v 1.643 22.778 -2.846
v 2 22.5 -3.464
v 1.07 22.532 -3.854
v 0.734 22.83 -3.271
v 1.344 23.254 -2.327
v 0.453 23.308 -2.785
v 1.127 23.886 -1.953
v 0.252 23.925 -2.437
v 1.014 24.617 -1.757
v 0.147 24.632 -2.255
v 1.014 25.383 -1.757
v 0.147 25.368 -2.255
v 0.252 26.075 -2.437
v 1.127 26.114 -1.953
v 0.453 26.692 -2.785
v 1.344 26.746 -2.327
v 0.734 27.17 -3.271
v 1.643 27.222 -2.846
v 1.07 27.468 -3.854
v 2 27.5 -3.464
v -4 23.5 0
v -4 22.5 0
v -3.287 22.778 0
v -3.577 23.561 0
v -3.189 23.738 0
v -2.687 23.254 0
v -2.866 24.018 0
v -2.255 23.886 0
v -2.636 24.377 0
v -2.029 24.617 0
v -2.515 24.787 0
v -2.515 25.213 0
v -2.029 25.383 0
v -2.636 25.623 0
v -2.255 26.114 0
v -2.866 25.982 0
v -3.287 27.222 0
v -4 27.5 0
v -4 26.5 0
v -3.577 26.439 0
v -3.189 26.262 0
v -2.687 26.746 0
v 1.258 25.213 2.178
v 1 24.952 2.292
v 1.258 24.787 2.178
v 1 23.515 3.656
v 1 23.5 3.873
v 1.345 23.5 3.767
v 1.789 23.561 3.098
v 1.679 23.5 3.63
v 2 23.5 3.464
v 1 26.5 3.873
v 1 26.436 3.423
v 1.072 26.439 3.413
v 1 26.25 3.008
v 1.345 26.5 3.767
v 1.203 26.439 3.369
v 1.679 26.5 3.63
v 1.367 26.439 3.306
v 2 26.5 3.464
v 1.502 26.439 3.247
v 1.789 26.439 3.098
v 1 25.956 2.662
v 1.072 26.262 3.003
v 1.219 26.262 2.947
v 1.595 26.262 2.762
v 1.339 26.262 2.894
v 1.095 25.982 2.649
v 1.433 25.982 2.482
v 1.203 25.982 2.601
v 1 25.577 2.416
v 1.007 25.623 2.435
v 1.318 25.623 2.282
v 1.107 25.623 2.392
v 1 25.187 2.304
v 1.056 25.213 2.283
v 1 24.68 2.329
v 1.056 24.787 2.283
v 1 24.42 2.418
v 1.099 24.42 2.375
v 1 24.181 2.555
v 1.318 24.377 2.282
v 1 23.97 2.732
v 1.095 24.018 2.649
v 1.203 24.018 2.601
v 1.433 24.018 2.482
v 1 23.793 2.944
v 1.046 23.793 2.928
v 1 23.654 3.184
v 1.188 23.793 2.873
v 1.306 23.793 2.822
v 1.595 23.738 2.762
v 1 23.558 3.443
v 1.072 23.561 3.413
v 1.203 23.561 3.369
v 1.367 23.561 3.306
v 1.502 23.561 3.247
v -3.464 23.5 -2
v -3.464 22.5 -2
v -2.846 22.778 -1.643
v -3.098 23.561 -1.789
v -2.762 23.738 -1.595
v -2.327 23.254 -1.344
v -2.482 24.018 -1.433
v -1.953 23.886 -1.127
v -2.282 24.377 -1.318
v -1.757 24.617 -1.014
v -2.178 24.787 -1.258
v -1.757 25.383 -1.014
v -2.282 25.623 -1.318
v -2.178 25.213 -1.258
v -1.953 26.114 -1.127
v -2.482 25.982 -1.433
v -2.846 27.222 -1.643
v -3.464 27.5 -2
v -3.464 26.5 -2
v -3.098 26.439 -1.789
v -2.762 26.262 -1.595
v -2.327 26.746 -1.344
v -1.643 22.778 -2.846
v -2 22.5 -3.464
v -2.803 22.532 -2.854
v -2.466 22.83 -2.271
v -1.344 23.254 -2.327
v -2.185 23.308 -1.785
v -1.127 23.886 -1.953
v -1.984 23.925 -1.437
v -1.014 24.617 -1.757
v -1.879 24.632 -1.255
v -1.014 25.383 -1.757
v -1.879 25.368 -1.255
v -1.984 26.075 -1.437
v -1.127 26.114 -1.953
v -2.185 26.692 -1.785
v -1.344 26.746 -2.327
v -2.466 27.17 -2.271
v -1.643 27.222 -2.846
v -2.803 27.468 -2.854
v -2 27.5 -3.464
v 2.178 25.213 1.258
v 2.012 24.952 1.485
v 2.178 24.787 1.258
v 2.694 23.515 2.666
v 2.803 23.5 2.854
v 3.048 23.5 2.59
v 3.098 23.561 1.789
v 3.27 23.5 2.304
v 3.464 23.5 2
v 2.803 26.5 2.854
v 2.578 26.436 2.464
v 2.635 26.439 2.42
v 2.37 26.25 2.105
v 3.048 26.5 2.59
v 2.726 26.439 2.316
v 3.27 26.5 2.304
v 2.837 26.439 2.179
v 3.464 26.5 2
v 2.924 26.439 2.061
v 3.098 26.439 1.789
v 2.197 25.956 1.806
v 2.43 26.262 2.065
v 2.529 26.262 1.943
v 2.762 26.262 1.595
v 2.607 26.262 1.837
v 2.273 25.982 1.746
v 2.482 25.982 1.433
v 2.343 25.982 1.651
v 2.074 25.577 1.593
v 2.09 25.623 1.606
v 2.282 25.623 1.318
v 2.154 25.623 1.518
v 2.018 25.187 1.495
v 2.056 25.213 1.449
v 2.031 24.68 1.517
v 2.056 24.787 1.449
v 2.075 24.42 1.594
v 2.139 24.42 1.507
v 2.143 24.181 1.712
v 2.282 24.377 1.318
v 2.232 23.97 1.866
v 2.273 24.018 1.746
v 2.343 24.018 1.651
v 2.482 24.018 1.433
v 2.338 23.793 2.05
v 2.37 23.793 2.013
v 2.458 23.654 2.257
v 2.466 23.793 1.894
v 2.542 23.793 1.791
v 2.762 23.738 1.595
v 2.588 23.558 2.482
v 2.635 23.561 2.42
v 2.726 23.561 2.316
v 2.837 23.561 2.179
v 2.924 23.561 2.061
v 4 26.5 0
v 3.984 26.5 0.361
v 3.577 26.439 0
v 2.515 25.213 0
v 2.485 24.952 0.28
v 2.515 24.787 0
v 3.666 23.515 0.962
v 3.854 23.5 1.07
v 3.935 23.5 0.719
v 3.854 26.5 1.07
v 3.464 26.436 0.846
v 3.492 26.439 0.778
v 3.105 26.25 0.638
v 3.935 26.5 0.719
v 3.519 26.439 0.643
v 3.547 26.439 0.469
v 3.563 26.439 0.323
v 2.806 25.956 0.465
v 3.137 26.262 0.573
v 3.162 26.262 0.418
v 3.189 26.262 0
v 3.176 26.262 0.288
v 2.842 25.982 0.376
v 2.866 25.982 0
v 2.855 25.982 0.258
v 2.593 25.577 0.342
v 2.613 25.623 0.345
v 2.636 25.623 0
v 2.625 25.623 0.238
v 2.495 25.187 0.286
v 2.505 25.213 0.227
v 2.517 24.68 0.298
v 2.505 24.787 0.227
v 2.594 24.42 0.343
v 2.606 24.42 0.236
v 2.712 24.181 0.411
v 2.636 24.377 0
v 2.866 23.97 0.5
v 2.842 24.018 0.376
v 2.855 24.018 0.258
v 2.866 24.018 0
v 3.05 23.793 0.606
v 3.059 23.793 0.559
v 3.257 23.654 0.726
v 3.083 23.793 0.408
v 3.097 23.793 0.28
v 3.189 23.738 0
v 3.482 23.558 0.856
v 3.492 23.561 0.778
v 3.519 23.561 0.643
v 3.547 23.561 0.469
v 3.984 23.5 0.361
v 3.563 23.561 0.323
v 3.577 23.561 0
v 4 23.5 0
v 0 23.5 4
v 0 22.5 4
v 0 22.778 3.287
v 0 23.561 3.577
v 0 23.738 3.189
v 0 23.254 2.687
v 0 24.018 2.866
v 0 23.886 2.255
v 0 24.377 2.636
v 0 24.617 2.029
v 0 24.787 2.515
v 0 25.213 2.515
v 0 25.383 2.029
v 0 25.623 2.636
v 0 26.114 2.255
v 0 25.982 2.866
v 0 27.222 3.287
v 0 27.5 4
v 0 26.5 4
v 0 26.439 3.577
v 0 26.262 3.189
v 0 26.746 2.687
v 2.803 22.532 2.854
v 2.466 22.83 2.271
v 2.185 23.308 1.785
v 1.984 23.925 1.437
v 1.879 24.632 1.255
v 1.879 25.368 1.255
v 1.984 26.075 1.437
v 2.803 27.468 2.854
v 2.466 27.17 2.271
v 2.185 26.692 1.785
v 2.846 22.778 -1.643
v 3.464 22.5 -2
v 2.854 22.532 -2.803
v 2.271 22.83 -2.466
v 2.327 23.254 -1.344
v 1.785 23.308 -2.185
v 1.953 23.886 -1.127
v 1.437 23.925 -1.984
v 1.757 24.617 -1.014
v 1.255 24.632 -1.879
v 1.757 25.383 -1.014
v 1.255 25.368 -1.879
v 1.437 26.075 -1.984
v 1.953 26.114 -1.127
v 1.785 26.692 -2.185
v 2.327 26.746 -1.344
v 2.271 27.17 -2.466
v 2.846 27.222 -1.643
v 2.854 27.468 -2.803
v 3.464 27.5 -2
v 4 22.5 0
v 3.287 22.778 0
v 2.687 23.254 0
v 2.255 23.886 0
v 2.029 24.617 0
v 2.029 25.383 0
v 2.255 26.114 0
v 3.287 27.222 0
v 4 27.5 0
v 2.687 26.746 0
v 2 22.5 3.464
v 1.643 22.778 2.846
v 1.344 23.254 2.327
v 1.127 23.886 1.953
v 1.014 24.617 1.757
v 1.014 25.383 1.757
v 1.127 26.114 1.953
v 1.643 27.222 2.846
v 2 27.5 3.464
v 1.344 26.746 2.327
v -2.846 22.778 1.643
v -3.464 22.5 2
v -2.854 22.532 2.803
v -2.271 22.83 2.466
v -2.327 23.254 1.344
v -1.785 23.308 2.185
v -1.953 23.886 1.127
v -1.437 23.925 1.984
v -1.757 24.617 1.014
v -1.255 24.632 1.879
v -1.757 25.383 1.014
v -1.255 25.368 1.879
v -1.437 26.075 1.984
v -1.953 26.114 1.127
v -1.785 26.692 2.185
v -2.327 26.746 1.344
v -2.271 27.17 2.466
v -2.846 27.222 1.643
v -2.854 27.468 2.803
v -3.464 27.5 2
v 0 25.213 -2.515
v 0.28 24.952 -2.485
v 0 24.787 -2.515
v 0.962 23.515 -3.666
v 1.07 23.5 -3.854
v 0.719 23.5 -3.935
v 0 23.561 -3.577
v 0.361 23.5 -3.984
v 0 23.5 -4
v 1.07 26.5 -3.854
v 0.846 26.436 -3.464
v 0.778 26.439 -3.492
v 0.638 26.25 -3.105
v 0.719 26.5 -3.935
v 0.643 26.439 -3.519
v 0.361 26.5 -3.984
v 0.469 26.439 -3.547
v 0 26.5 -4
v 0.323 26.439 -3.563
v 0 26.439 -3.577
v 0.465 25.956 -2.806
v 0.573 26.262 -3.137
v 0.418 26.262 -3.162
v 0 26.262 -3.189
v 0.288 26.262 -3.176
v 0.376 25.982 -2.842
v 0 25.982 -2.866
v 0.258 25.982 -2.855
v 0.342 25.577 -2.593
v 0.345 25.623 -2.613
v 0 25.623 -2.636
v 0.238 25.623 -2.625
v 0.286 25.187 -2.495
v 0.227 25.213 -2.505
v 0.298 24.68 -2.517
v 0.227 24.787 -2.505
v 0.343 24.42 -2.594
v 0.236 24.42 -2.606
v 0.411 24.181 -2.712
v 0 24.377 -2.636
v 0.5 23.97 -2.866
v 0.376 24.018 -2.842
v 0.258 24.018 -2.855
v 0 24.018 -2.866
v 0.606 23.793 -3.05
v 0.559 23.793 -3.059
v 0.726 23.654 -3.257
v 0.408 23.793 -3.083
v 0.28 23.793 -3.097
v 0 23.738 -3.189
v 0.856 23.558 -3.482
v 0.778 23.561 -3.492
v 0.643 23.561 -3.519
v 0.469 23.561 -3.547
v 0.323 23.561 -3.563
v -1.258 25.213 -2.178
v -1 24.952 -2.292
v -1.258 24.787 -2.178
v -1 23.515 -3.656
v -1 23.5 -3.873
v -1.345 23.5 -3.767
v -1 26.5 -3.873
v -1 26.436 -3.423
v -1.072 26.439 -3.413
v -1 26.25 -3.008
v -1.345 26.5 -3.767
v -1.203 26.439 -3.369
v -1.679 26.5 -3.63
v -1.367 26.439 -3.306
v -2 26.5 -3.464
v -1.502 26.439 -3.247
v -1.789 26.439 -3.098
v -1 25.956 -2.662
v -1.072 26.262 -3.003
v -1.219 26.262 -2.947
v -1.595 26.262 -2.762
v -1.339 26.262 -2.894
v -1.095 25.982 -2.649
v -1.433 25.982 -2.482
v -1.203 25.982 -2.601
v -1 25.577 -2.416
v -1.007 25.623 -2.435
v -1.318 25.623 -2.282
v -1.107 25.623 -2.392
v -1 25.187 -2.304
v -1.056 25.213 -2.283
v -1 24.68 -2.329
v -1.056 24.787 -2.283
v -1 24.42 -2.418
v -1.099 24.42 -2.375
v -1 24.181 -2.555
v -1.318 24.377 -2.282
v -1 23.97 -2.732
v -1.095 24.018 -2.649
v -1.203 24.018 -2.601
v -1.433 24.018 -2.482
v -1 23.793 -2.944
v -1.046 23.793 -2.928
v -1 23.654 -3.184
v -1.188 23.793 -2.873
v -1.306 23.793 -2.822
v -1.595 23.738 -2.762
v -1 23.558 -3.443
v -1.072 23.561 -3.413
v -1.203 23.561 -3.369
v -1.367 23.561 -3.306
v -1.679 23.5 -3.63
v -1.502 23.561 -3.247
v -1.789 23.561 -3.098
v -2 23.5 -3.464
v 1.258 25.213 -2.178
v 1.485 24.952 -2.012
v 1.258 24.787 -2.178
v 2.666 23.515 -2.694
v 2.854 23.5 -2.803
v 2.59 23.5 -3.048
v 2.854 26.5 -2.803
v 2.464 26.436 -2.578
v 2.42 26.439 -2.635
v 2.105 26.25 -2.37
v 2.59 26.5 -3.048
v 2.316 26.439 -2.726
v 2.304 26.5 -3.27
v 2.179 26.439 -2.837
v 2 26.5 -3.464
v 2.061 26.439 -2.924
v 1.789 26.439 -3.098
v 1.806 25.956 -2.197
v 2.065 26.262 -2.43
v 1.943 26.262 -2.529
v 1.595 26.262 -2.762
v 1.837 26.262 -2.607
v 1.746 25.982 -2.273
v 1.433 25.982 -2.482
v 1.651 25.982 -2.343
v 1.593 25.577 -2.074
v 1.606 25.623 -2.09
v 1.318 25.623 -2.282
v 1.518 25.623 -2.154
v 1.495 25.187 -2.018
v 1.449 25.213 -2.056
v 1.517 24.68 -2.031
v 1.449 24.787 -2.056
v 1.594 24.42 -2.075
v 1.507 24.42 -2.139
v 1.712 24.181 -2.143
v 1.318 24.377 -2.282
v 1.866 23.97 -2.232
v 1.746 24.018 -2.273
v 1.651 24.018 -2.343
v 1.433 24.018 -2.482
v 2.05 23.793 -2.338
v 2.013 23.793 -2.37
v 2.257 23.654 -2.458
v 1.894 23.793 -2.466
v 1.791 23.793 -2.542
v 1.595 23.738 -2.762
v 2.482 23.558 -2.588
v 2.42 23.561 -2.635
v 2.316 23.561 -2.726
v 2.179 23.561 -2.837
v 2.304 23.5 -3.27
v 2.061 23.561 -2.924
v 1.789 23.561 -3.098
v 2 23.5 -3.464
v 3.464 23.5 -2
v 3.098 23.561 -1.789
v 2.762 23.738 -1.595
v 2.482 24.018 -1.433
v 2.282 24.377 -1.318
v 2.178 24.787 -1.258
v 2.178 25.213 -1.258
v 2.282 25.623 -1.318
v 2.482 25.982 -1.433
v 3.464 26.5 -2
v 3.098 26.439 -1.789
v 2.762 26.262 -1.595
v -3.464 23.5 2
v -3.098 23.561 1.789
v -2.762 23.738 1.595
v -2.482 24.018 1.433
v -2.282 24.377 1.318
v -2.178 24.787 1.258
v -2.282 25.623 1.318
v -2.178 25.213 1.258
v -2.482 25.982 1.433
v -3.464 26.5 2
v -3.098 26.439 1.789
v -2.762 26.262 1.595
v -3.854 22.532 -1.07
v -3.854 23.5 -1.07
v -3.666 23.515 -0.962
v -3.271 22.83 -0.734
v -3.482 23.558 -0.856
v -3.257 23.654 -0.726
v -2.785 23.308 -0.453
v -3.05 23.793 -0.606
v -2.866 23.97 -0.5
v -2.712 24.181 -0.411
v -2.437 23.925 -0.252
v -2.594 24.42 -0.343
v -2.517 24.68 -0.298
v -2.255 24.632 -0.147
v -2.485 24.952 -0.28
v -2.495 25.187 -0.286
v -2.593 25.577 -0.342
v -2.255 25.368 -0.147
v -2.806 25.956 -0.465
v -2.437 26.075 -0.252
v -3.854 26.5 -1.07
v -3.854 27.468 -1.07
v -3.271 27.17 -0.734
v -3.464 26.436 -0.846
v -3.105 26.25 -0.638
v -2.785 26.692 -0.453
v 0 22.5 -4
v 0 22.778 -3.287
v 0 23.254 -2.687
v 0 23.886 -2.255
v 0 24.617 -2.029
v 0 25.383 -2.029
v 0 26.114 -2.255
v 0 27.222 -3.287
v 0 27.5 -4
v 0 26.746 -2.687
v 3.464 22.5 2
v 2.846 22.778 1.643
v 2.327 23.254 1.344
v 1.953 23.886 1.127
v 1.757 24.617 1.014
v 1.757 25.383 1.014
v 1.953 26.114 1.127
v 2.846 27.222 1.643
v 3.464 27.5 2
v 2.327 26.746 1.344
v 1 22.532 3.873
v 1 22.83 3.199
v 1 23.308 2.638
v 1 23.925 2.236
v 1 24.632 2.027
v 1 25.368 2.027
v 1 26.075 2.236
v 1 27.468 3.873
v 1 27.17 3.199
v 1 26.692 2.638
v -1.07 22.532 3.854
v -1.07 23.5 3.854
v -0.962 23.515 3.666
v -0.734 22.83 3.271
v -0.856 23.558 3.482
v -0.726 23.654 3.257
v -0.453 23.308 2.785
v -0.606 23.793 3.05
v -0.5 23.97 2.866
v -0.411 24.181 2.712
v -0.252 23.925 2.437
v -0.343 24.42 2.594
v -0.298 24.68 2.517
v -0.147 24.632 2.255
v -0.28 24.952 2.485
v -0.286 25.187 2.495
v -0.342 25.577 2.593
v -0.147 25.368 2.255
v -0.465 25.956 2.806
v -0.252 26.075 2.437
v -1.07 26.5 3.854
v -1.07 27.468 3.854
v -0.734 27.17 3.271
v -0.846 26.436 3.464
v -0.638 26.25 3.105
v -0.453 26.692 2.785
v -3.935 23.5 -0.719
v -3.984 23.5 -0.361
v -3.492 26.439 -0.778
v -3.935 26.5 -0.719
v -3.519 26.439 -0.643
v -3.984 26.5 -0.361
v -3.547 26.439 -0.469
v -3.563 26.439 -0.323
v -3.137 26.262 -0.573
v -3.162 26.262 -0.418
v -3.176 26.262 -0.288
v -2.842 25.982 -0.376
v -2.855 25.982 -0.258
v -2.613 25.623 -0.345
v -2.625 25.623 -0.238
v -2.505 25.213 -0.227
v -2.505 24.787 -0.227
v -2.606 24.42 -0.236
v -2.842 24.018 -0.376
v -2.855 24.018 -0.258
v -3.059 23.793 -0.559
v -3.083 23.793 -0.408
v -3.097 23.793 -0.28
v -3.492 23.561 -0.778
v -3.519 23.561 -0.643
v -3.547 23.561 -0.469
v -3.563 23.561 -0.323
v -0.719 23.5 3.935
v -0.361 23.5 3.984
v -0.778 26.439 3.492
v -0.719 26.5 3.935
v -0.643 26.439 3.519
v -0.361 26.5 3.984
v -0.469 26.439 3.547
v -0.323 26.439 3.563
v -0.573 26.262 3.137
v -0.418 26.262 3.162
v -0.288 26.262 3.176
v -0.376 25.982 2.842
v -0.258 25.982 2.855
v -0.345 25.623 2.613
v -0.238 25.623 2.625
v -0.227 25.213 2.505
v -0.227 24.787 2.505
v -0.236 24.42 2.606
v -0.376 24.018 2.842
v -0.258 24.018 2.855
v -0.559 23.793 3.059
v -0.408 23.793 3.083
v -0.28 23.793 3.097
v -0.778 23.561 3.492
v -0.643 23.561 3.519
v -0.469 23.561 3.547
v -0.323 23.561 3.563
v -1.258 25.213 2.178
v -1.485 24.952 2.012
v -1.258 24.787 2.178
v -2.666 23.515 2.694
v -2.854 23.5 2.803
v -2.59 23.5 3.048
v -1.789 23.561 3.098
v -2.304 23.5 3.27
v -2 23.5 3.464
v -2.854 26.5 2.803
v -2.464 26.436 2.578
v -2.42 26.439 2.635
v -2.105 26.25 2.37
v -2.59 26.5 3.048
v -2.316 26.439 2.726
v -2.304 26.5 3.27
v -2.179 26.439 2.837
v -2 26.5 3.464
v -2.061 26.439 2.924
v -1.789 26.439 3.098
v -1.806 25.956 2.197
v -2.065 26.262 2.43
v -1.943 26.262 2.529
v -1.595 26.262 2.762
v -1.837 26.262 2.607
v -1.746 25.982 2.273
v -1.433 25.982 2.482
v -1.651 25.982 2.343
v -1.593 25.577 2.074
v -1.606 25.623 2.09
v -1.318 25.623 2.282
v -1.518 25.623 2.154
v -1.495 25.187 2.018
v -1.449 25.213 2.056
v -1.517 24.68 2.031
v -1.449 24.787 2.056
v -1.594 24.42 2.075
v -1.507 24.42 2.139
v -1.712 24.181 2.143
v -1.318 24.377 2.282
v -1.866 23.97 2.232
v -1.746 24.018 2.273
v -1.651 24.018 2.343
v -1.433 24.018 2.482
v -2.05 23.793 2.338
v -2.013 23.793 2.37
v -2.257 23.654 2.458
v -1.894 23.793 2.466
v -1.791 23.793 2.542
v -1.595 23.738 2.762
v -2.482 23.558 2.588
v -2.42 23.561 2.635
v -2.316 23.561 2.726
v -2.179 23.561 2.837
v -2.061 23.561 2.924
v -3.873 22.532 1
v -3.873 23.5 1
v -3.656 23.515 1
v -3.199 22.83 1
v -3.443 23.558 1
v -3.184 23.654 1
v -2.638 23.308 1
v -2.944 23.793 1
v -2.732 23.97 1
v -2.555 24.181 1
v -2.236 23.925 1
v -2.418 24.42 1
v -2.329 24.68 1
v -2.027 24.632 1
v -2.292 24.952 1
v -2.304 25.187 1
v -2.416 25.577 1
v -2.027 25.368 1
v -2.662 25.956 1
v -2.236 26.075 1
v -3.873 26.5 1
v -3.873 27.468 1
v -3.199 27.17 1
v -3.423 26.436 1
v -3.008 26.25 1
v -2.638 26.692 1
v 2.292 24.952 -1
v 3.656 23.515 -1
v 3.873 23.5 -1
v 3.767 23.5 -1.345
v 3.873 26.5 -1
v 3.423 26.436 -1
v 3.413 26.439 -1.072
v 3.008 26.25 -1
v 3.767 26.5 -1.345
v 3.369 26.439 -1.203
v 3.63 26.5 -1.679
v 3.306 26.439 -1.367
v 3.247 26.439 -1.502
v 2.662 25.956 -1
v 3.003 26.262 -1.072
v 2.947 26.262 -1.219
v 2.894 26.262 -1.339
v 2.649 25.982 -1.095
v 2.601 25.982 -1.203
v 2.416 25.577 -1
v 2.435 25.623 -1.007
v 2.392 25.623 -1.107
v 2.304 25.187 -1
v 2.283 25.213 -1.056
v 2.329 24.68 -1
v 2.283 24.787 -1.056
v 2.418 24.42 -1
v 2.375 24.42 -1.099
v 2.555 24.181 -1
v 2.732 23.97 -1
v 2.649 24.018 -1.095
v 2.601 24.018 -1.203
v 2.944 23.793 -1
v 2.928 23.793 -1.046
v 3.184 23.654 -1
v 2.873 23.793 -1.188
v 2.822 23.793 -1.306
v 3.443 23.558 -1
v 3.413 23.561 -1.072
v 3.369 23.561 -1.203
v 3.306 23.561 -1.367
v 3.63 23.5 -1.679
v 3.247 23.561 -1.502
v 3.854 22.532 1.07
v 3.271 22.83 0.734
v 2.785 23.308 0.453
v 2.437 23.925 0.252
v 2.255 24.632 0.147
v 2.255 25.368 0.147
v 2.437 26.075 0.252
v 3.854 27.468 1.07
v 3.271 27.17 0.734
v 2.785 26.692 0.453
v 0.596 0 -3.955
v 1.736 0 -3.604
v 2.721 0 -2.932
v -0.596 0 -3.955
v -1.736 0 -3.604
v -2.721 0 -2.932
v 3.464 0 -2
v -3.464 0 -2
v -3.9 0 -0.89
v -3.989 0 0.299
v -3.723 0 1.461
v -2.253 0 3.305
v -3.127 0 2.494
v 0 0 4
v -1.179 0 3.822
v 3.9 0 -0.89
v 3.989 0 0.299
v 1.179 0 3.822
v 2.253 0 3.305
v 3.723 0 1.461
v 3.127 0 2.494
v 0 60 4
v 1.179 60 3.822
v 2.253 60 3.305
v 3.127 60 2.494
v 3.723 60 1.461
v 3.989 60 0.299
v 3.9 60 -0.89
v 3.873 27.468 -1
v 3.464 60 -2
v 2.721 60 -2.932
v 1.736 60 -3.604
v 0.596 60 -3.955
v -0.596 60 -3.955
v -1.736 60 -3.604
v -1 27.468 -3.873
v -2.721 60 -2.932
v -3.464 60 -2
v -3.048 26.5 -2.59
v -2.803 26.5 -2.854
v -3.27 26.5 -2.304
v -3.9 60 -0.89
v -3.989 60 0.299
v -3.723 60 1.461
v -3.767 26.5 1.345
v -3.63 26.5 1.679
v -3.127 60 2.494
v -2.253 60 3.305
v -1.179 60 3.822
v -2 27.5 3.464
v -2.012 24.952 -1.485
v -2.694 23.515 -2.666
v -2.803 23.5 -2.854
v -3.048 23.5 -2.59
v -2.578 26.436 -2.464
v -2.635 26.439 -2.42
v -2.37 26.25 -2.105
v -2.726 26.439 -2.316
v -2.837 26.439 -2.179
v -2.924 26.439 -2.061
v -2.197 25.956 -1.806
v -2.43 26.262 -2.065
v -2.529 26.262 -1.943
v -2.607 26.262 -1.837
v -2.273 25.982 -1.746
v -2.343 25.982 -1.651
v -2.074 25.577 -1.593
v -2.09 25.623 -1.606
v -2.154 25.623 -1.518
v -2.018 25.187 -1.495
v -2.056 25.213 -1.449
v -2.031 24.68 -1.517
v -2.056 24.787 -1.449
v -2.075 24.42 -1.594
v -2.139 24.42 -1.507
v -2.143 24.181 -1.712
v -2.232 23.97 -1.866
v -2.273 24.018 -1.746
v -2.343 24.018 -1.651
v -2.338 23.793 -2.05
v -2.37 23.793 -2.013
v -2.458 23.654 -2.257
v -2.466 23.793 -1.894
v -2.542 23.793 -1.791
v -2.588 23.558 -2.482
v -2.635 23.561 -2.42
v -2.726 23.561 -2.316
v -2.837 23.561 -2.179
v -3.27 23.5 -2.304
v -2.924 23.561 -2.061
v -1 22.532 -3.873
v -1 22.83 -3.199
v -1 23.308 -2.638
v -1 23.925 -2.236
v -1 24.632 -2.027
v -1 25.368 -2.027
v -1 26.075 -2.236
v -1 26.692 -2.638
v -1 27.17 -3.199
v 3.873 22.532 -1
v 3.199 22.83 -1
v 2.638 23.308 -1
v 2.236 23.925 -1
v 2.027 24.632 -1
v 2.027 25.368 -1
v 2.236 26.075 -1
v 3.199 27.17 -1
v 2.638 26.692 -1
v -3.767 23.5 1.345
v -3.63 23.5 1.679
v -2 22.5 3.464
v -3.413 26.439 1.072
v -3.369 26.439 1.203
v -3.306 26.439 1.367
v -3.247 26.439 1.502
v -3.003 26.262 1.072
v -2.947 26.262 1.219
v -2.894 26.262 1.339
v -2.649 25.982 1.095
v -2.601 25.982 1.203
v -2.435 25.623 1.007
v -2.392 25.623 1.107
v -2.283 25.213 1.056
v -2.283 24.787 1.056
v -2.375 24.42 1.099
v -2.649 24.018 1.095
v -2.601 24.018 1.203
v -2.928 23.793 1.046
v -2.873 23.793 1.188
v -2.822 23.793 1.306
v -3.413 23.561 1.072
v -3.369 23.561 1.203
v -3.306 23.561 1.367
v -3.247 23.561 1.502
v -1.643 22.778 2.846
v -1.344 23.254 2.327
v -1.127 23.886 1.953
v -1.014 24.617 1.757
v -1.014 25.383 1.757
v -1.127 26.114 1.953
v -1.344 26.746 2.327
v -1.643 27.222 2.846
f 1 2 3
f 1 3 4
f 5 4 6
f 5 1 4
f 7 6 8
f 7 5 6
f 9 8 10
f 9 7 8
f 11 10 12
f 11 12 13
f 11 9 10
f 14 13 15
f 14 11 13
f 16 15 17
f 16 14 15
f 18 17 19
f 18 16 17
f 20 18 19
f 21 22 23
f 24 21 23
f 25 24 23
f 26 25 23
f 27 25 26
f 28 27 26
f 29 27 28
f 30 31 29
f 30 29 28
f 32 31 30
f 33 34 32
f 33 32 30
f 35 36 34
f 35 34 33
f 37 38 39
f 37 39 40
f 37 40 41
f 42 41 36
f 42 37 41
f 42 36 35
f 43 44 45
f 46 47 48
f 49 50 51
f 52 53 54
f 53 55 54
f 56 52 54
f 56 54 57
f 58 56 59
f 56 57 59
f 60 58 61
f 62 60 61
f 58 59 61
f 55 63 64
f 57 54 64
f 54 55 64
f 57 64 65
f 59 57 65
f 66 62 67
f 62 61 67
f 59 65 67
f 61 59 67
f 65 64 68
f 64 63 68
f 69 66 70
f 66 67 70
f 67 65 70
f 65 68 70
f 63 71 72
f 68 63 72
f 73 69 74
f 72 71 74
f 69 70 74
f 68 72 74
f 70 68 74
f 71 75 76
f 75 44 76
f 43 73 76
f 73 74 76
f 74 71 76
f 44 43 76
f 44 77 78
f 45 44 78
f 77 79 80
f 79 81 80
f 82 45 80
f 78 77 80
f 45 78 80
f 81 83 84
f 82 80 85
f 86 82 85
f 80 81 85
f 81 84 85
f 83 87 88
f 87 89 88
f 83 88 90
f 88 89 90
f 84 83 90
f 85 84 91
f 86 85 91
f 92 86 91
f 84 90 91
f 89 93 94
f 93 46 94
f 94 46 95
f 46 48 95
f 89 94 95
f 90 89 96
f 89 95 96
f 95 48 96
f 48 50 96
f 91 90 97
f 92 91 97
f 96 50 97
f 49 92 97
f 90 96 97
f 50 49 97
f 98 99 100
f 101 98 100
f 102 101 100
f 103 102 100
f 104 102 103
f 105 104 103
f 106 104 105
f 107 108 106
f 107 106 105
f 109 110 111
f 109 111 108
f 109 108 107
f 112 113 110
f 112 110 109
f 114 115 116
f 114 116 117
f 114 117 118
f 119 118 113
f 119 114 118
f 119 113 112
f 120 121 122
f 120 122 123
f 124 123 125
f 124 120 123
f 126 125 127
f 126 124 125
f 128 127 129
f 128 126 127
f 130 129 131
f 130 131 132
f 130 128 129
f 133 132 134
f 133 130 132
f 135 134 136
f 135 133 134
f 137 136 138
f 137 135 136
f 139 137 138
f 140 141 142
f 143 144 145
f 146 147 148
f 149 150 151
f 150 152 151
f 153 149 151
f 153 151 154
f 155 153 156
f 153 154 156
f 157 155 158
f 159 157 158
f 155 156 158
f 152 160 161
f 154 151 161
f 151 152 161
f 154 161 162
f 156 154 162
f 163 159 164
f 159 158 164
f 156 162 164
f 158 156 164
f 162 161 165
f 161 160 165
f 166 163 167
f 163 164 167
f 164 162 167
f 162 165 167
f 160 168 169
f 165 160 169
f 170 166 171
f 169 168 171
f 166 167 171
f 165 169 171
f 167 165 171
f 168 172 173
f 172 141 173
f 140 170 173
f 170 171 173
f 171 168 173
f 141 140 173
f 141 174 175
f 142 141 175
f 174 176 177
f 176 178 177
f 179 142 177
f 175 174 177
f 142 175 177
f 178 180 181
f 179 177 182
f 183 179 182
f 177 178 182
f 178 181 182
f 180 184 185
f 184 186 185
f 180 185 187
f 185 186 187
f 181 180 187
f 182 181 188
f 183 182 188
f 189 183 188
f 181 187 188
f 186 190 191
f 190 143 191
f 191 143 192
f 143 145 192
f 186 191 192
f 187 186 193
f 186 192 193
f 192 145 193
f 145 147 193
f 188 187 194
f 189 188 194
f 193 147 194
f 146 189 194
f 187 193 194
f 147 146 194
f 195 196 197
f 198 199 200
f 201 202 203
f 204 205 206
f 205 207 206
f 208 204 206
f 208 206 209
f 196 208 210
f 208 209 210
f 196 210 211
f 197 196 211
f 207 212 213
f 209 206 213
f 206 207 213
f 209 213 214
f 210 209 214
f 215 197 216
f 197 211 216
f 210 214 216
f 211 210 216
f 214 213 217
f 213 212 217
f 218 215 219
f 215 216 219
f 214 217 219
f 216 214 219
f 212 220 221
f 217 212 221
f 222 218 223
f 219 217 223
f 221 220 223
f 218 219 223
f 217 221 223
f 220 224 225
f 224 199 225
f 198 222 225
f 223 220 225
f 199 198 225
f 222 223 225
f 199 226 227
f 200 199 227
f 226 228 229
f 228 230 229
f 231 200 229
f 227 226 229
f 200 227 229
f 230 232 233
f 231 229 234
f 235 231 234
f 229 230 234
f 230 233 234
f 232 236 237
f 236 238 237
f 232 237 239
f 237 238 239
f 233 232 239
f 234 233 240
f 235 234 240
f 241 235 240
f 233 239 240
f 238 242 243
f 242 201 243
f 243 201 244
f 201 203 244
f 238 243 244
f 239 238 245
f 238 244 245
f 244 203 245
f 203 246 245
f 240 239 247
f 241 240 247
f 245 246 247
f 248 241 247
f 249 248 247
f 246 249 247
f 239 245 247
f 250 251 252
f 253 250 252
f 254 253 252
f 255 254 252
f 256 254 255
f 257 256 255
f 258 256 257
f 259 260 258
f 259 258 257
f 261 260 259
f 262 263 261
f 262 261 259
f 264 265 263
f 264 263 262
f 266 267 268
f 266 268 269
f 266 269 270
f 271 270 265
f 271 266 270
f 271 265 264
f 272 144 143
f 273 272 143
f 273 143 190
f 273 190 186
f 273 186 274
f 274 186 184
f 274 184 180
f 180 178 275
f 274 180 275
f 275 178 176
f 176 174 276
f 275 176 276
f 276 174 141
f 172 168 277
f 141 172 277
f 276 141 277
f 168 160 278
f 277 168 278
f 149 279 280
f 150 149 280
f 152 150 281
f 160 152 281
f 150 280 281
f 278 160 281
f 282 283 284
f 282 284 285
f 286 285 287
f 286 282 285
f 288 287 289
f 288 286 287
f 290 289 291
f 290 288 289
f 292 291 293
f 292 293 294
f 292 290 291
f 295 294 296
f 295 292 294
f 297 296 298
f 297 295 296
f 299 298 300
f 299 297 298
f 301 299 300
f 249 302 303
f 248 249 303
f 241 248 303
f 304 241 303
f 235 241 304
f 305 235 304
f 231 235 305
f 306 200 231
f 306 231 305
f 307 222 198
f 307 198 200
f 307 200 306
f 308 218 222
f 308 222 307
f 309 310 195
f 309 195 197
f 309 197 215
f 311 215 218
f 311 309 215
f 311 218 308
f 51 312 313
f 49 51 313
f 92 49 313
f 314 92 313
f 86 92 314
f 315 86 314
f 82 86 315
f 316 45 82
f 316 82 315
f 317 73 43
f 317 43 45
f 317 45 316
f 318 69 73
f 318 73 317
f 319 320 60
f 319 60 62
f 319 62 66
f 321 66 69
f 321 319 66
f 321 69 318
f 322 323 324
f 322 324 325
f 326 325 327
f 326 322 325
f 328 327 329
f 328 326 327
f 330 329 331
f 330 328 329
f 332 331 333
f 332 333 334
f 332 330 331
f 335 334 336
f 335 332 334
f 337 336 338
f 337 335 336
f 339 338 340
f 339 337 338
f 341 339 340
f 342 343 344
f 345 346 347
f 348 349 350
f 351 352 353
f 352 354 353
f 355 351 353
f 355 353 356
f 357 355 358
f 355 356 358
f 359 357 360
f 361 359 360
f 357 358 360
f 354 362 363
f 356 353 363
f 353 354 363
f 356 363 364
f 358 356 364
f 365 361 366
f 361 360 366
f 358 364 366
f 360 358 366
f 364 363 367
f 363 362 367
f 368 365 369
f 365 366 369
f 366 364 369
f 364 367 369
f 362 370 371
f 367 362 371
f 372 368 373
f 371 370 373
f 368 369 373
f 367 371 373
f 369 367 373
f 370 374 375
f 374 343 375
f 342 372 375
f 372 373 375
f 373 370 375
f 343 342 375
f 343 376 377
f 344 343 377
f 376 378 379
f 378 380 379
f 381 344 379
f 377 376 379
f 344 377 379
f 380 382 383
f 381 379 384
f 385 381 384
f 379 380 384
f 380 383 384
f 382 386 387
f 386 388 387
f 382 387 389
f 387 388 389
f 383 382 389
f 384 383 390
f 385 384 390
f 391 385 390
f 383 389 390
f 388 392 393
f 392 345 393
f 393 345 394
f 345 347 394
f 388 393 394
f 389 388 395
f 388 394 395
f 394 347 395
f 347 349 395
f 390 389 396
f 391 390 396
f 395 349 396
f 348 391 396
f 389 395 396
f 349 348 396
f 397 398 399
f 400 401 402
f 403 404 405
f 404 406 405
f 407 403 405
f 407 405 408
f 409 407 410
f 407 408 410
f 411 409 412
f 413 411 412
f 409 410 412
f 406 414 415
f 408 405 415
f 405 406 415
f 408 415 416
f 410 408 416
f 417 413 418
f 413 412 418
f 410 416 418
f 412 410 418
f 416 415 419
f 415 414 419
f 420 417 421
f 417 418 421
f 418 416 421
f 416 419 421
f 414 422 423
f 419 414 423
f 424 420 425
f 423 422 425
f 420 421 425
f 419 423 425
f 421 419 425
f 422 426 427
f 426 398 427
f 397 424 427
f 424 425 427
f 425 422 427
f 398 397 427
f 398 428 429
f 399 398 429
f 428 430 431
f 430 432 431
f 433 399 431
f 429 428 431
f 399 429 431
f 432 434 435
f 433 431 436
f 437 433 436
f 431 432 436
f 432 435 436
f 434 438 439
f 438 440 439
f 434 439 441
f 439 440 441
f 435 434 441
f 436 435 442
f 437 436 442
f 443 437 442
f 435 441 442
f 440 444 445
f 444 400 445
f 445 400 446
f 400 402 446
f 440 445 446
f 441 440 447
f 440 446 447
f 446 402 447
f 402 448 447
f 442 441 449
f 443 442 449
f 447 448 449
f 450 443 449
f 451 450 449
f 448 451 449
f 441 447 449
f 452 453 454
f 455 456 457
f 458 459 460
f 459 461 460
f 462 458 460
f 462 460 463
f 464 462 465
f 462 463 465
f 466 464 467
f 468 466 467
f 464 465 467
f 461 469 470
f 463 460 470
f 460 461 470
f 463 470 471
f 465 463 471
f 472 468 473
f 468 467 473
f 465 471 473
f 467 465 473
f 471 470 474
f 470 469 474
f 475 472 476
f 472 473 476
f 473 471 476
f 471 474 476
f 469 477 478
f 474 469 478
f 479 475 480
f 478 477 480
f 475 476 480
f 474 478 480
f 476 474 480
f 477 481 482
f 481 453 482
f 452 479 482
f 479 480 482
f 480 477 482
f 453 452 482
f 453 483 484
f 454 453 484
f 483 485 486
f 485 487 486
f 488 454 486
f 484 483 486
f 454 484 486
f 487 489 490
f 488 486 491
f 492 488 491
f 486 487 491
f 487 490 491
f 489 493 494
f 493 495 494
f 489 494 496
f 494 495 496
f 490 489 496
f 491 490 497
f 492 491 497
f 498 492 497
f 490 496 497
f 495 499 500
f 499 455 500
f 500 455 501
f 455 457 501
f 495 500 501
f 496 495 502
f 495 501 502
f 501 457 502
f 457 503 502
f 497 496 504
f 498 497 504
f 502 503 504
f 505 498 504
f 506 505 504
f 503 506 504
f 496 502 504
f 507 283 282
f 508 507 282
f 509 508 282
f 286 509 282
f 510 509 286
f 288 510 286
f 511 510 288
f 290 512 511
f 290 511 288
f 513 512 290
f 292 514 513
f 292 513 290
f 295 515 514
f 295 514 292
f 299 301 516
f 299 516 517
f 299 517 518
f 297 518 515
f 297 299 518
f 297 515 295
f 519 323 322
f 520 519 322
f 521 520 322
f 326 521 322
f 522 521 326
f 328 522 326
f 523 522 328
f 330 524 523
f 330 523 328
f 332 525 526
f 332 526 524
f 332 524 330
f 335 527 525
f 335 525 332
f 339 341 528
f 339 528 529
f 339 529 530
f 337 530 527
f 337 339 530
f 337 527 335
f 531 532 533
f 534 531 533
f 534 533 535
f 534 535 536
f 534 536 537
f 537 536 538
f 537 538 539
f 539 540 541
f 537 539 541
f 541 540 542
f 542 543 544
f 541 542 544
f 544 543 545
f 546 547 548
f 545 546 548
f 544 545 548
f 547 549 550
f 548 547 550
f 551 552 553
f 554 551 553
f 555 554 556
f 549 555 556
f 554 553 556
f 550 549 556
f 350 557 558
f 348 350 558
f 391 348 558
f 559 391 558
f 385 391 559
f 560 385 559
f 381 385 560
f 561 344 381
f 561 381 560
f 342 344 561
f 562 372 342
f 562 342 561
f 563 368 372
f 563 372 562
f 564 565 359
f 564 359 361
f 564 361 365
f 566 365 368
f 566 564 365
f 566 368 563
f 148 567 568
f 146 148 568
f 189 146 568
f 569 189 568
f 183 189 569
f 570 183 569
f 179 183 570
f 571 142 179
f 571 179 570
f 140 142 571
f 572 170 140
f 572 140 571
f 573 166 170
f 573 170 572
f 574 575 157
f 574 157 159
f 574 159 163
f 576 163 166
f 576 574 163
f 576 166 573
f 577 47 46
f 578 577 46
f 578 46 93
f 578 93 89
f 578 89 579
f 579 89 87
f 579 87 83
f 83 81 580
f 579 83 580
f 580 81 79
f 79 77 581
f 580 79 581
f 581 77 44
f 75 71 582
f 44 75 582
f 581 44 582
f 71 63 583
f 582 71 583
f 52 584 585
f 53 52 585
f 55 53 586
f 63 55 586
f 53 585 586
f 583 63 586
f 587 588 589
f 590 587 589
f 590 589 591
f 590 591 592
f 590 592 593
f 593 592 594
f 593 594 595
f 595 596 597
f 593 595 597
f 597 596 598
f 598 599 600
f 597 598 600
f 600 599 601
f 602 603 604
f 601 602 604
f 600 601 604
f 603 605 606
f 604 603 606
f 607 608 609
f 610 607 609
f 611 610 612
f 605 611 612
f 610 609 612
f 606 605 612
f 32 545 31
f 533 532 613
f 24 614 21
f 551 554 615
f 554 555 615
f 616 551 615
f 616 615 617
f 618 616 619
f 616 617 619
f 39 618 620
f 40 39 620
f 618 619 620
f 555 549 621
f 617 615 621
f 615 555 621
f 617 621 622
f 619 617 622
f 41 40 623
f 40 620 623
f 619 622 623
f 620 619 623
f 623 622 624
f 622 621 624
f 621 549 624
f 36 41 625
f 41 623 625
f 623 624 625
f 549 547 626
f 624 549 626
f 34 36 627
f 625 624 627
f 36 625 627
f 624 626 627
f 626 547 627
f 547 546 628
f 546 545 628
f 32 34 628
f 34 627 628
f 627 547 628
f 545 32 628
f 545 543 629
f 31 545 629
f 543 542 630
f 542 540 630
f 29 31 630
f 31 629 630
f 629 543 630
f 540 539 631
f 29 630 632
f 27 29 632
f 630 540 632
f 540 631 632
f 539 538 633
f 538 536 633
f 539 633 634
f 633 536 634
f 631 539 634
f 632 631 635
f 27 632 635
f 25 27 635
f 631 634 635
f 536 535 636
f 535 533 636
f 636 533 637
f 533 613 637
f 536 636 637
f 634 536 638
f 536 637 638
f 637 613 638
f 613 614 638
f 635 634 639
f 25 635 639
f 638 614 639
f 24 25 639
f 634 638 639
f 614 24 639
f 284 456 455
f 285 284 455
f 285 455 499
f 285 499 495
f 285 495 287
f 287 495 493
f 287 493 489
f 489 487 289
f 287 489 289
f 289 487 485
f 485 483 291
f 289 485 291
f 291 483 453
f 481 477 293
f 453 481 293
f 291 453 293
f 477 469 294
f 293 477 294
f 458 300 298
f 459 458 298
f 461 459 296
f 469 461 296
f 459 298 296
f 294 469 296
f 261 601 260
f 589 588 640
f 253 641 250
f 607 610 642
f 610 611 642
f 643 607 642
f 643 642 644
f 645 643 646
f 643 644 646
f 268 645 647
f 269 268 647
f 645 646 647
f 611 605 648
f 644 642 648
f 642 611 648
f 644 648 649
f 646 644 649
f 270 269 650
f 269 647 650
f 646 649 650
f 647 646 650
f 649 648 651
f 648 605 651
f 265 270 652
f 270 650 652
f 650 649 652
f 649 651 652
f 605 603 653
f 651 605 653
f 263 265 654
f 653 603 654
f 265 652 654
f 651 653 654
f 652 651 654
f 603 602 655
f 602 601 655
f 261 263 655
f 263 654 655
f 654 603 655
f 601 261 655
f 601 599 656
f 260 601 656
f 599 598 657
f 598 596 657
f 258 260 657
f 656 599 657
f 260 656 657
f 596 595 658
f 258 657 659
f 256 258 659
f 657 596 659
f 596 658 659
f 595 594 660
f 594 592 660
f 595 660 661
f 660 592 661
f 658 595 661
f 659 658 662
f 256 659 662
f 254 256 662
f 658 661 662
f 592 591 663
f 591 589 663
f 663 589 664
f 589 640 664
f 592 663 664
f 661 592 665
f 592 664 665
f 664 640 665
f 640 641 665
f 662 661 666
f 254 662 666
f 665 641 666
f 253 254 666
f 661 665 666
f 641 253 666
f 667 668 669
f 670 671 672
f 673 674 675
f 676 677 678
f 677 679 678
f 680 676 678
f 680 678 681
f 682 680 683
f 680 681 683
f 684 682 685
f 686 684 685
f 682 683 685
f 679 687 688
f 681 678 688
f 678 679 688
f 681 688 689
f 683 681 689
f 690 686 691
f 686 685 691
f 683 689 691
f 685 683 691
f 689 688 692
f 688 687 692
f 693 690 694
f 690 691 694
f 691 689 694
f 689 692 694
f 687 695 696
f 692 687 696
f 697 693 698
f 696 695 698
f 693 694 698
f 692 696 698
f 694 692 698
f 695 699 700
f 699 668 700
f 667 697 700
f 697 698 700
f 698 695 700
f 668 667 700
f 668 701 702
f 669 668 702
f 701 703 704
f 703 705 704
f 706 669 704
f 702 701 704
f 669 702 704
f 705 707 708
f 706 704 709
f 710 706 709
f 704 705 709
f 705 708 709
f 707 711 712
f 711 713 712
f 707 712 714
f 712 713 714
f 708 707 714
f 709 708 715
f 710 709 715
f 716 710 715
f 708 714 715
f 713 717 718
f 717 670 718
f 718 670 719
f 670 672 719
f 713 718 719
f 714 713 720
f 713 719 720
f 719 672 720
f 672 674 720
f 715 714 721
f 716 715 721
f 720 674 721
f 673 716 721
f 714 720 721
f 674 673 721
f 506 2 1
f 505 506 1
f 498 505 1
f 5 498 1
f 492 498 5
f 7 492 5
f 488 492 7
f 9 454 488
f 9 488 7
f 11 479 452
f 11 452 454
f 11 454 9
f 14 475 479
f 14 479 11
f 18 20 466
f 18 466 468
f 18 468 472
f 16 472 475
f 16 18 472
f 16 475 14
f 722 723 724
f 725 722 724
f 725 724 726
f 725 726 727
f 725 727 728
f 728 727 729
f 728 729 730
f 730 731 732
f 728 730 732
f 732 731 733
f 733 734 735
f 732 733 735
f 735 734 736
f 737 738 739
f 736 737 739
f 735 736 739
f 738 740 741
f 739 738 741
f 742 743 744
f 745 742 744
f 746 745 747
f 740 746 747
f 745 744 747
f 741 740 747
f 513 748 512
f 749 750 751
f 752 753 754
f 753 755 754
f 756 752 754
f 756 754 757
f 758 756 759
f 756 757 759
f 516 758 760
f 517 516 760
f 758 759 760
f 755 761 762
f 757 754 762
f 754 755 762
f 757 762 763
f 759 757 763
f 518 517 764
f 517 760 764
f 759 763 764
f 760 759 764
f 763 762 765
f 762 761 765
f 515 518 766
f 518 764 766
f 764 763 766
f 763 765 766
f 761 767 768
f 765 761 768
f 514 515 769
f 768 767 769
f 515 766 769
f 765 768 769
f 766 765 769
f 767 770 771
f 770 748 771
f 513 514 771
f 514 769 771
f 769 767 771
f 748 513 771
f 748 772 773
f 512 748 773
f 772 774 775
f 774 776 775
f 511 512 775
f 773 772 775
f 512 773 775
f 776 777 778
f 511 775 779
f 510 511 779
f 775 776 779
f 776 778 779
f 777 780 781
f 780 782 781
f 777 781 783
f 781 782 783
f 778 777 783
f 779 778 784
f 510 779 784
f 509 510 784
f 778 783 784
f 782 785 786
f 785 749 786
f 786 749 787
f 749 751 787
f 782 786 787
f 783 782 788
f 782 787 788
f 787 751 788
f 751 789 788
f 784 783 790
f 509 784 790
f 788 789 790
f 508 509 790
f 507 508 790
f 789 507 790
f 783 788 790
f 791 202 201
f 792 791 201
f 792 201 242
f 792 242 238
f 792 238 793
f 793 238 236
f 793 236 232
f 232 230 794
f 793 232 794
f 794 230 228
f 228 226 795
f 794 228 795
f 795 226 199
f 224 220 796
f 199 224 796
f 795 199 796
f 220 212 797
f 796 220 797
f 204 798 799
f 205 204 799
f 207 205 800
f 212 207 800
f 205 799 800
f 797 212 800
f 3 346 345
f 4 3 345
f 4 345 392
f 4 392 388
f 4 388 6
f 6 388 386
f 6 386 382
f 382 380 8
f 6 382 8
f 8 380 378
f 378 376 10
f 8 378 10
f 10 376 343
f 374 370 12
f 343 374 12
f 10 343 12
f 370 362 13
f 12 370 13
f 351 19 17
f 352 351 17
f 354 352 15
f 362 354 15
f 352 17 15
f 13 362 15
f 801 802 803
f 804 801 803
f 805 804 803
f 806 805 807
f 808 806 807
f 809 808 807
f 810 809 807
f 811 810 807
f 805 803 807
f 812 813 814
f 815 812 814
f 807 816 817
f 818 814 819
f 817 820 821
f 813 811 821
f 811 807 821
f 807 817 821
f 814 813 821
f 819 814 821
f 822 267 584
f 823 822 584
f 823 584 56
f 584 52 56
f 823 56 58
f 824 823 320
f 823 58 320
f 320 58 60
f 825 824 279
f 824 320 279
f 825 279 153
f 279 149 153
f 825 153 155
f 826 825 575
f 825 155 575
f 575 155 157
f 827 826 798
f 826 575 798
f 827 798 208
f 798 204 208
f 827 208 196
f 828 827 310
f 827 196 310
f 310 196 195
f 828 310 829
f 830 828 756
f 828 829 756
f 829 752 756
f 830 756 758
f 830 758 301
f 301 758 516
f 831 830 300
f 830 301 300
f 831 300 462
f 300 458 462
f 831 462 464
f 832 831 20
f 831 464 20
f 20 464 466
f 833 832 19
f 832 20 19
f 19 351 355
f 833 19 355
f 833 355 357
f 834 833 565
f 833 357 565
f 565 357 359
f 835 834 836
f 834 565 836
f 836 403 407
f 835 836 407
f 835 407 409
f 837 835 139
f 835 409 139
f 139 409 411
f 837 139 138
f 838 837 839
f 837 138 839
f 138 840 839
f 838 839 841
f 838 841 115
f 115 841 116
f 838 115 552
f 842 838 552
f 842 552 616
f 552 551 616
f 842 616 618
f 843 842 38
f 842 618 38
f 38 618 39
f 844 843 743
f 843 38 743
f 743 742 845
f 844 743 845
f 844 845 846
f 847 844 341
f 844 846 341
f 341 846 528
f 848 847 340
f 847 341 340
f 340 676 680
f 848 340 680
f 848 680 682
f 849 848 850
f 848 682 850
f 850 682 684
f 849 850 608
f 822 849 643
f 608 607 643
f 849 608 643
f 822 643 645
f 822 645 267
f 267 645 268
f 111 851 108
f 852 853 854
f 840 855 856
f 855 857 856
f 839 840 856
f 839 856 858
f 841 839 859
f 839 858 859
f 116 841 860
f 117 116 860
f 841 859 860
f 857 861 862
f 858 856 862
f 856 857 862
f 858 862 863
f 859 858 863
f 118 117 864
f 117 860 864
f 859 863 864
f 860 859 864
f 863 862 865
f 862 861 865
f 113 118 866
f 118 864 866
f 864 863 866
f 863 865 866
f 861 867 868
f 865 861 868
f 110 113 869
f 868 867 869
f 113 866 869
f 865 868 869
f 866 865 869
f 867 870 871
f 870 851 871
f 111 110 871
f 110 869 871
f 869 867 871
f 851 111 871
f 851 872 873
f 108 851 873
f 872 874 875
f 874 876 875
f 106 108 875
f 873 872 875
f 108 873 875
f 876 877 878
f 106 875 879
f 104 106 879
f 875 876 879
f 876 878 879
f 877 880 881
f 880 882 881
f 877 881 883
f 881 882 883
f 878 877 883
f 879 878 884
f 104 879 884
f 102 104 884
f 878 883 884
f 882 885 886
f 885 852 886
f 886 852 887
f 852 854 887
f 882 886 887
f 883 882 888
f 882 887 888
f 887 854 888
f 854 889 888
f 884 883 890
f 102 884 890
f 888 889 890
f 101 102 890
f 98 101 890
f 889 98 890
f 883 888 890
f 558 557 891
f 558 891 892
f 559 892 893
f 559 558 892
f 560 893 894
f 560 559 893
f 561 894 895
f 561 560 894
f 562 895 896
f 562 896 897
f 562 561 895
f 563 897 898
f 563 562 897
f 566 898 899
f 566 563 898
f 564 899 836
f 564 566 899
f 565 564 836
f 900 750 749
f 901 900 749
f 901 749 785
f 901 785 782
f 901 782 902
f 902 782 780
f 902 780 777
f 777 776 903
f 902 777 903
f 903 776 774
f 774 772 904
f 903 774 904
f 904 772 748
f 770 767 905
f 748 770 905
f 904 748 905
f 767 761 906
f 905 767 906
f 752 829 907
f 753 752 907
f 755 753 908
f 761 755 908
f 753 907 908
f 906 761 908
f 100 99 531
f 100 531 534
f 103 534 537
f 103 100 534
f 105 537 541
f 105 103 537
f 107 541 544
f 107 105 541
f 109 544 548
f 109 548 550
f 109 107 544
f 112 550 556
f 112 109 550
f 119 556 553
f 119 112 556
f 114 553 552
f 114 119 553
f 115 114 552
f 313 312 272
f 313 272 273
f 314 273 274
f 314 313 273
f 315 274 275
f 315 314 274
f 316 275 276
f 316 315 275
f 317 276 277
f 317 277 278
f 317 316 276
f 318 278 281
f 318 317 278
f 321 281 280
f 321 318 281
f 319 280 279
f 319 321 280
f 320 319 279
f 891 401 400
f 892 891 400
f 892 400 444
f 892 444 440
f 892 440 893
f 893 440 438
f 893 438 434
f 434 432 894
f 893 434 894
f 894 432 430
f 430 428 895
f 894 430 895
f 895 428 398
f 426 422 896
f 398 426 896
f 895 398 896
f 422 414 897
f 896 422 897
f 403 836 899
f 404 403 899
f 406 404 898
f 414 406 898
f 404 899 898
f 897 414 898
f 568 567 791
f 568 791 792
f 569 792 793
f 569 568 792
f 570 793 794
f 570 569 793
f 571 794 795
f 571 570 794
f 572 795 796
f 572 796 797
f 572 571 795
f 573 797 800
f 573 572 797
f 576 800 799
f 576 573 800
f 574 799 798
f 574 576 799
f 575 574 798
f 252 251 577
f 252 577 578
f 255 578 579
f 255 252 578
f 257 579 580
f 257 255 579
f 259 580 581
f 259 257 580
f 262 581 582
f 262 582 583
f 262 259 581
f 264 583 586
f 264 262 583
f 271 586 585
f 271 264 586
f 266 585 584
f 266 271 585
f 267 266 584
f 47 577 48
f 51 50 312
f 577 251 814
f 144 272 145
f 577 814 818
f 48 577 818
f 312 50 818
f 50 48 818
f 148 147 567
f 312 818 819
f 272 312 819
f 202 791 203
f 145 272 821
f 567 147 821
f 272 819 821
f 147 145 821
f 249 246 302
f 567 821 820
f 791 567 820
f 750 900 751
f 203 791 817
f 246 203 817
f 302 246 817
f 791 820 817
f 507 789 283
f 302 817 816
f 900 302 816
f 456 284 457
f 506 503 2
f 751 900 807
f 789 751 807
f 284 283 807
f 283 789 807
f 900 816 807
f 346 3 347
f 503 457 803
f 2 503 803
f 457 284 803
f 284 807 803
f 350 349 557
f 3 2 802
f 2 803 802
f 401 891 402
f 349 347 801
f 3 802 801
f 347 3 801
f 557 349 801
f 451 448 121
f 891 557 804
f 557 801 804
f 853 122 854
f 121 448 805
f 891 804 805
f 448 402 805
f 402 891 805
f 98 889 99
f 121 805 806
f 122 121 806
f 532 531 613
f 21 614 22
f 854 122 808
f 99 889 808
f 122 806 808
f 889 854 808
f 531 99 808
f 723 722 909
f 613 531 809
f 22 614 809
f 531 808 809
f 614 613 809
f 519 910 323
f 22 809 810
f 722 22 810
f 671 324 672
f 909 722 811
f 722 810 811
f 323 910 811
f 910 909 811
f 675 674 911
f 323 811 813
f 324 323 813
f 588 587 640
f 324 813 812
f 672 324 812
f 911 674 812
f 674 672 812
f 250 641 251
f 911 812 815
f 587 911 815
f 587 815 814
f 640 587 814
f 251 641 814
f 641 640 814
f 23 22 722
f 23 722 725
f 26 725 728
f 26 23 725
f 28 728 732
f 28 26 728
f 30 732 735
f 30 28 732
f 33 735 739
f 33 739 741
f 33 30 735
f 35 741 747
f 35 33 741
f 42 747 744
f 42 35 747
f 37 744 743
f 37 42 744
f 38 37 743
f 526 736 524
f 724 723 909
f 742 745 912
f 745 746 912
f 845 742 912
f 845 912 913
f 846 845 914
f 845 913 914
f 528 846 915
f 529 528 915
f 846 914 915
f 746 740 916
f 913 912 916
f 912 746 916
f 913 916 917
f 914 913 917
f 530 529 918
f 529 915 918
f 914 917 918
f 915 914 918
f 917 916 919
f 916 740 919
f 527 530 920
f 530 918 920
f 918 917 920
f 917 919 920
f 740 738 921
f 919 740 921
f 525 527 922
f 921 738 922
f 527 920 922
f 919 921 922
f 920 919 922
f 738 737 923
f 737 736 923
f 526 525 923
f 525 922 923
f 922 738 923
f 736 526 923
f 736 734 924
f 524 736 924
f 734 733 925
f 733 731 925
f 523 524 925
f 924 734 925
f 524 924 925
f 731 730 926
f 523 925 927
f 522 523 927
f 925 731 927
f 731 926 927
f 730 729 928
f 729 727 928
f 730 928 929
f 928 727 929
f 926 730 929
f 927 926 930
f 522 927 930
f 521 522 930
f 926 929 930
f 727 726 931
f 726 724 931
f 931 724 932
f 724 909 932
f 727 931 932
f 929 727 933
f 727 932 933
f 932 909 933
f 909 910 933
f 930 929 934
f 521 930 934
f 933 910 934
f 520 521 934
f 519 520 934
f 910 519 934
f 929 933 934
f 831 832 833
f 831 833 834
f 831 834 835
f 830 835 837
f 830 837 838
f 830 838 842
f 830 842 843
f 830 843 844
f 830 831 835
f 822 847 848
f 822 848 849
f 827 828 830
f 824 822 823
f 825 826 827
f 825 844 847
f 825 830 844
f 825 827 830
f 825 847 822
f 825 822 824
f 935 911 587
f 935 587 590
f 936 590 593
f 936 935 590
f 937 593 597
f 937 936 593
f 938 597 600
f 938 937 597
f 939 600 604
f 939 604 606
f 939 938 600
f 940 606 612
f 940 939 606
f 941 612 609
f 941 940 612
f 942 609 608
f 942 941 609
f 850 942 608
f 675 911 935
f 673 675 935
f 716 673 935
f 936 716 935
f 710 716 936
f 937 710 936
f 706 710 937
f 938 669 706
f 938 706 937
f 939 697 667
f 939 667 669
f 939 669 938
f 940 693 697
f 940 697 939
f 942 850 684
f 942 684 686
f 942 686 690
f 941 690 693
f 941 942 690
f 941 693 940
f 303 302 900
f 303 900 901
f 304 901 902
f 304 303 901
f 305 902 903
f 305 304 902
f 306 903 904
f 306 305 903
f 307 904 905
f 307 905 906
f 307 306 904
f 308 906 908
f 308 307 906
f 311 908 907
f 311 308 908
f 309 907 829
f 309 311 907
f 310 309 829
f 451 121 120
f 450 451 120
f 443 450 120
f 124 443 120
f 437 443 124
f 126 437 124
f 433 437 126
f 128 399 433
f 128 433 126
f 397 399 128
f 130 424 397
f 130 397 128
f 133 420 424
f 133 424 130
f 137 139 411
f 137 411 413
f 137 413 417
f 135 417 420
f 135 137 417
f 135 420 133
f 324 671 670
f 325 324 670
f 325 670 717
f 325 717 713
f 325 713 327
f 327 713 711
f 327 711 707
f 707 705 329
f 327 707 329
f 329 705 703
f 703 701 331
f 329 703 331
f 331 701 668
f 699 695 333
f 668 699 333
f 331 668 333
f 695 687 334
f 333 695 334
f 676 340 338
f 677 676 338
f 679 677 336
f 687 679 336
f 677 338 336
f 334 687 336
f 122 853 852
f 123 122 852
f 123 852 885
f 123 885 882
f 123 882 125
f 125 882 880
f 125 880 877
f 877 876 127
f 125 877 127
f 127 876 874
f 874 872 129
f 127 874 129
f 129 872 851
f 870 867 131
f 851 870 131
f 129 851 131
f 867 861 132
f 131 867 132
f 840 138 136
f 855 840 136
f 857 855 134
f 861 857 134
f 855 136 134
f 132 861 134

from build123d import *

# Parameters (mm, degrees)
ESQUISSE1_R             = 4
BOSS_EXTRU_1_DEPTH      = 60
ENL_V_MAT_EXTRU_2_DEPTH = 1
R_P_T_PAR_COURBE1_COUNT = 12
ESQUISSE5_R             = 1.5


with BuildPart() as part:
    # Esquisse1 → Boss.-Extru.1 (new body)
    with BuildSketch(Plane(origin=(0, 0, 0), x_dir=(1, 0, 0), z_dir=(0, 1, 0))):
        with Locations(Location((0, 0, 0), (0, 0, 270))):
            Circle(ESQUISSE1_R)
    extrude(amount=BOSS_EXTRU_1_DEPTH)

    # Esquisse4 → Enlèv. mat.-Extru.2 (cut)
    with BuildSketch(Plane.XY):
        with BuildLine():
            Line((4, 27.5), (4, 22.5))
            ThreePointArc((4, 22.5), (2, 25), (4, 27.5))
        make_face()
    enl_v_mat_extru_2 = extrude(amount=-ENL_V_MAT_EXTRU_2_DEPTH, mode=Mode.SUBTRACT)

    # Répét. par courbe1: Enlèv. mat.-Extru.2 ×12 about axis
    r_p_t_par_courbe1_axis = Axis((0, 25, 0), (0, -1, 0))
    for i in range(1, R_P_T_PAR_COURBE1_COUNT):
        add(enl_v_mat_extru_2.rotate(r_p_t_par_courbe1_axis, i * 360 / R_P_T_PAR_COURBE1_COUNT), mode=Mode.SUBTRACT)

    # Enlèvement de matière-Balayage1: sweep along a path in Esquisse3
    with BuildLine(Plane(origin=(0, 25, 0), x_dir=(1, 0, 0), z_dir=(0, 1, 0))) as enl_vement_de_mati_re_balayage1_path:
        CenterArc((0, 0), 4, 0, 360)
    # Esquisse5 → Enlèvement de matière-Balayage1 (sweep, cut)
    with BuildSketch(Plane(origin=(0, 0, 0), x_dir=(0, 0, -1), z_dir=(1, 0, 0))):
        with Locations((-4, 25)):
            Circle(ESQUISSE5_R)
    sweep(path=enl_vement_de_mati_re_balayage1_path.line, mode=Mode.SUBTRACT)


solid = part.part
